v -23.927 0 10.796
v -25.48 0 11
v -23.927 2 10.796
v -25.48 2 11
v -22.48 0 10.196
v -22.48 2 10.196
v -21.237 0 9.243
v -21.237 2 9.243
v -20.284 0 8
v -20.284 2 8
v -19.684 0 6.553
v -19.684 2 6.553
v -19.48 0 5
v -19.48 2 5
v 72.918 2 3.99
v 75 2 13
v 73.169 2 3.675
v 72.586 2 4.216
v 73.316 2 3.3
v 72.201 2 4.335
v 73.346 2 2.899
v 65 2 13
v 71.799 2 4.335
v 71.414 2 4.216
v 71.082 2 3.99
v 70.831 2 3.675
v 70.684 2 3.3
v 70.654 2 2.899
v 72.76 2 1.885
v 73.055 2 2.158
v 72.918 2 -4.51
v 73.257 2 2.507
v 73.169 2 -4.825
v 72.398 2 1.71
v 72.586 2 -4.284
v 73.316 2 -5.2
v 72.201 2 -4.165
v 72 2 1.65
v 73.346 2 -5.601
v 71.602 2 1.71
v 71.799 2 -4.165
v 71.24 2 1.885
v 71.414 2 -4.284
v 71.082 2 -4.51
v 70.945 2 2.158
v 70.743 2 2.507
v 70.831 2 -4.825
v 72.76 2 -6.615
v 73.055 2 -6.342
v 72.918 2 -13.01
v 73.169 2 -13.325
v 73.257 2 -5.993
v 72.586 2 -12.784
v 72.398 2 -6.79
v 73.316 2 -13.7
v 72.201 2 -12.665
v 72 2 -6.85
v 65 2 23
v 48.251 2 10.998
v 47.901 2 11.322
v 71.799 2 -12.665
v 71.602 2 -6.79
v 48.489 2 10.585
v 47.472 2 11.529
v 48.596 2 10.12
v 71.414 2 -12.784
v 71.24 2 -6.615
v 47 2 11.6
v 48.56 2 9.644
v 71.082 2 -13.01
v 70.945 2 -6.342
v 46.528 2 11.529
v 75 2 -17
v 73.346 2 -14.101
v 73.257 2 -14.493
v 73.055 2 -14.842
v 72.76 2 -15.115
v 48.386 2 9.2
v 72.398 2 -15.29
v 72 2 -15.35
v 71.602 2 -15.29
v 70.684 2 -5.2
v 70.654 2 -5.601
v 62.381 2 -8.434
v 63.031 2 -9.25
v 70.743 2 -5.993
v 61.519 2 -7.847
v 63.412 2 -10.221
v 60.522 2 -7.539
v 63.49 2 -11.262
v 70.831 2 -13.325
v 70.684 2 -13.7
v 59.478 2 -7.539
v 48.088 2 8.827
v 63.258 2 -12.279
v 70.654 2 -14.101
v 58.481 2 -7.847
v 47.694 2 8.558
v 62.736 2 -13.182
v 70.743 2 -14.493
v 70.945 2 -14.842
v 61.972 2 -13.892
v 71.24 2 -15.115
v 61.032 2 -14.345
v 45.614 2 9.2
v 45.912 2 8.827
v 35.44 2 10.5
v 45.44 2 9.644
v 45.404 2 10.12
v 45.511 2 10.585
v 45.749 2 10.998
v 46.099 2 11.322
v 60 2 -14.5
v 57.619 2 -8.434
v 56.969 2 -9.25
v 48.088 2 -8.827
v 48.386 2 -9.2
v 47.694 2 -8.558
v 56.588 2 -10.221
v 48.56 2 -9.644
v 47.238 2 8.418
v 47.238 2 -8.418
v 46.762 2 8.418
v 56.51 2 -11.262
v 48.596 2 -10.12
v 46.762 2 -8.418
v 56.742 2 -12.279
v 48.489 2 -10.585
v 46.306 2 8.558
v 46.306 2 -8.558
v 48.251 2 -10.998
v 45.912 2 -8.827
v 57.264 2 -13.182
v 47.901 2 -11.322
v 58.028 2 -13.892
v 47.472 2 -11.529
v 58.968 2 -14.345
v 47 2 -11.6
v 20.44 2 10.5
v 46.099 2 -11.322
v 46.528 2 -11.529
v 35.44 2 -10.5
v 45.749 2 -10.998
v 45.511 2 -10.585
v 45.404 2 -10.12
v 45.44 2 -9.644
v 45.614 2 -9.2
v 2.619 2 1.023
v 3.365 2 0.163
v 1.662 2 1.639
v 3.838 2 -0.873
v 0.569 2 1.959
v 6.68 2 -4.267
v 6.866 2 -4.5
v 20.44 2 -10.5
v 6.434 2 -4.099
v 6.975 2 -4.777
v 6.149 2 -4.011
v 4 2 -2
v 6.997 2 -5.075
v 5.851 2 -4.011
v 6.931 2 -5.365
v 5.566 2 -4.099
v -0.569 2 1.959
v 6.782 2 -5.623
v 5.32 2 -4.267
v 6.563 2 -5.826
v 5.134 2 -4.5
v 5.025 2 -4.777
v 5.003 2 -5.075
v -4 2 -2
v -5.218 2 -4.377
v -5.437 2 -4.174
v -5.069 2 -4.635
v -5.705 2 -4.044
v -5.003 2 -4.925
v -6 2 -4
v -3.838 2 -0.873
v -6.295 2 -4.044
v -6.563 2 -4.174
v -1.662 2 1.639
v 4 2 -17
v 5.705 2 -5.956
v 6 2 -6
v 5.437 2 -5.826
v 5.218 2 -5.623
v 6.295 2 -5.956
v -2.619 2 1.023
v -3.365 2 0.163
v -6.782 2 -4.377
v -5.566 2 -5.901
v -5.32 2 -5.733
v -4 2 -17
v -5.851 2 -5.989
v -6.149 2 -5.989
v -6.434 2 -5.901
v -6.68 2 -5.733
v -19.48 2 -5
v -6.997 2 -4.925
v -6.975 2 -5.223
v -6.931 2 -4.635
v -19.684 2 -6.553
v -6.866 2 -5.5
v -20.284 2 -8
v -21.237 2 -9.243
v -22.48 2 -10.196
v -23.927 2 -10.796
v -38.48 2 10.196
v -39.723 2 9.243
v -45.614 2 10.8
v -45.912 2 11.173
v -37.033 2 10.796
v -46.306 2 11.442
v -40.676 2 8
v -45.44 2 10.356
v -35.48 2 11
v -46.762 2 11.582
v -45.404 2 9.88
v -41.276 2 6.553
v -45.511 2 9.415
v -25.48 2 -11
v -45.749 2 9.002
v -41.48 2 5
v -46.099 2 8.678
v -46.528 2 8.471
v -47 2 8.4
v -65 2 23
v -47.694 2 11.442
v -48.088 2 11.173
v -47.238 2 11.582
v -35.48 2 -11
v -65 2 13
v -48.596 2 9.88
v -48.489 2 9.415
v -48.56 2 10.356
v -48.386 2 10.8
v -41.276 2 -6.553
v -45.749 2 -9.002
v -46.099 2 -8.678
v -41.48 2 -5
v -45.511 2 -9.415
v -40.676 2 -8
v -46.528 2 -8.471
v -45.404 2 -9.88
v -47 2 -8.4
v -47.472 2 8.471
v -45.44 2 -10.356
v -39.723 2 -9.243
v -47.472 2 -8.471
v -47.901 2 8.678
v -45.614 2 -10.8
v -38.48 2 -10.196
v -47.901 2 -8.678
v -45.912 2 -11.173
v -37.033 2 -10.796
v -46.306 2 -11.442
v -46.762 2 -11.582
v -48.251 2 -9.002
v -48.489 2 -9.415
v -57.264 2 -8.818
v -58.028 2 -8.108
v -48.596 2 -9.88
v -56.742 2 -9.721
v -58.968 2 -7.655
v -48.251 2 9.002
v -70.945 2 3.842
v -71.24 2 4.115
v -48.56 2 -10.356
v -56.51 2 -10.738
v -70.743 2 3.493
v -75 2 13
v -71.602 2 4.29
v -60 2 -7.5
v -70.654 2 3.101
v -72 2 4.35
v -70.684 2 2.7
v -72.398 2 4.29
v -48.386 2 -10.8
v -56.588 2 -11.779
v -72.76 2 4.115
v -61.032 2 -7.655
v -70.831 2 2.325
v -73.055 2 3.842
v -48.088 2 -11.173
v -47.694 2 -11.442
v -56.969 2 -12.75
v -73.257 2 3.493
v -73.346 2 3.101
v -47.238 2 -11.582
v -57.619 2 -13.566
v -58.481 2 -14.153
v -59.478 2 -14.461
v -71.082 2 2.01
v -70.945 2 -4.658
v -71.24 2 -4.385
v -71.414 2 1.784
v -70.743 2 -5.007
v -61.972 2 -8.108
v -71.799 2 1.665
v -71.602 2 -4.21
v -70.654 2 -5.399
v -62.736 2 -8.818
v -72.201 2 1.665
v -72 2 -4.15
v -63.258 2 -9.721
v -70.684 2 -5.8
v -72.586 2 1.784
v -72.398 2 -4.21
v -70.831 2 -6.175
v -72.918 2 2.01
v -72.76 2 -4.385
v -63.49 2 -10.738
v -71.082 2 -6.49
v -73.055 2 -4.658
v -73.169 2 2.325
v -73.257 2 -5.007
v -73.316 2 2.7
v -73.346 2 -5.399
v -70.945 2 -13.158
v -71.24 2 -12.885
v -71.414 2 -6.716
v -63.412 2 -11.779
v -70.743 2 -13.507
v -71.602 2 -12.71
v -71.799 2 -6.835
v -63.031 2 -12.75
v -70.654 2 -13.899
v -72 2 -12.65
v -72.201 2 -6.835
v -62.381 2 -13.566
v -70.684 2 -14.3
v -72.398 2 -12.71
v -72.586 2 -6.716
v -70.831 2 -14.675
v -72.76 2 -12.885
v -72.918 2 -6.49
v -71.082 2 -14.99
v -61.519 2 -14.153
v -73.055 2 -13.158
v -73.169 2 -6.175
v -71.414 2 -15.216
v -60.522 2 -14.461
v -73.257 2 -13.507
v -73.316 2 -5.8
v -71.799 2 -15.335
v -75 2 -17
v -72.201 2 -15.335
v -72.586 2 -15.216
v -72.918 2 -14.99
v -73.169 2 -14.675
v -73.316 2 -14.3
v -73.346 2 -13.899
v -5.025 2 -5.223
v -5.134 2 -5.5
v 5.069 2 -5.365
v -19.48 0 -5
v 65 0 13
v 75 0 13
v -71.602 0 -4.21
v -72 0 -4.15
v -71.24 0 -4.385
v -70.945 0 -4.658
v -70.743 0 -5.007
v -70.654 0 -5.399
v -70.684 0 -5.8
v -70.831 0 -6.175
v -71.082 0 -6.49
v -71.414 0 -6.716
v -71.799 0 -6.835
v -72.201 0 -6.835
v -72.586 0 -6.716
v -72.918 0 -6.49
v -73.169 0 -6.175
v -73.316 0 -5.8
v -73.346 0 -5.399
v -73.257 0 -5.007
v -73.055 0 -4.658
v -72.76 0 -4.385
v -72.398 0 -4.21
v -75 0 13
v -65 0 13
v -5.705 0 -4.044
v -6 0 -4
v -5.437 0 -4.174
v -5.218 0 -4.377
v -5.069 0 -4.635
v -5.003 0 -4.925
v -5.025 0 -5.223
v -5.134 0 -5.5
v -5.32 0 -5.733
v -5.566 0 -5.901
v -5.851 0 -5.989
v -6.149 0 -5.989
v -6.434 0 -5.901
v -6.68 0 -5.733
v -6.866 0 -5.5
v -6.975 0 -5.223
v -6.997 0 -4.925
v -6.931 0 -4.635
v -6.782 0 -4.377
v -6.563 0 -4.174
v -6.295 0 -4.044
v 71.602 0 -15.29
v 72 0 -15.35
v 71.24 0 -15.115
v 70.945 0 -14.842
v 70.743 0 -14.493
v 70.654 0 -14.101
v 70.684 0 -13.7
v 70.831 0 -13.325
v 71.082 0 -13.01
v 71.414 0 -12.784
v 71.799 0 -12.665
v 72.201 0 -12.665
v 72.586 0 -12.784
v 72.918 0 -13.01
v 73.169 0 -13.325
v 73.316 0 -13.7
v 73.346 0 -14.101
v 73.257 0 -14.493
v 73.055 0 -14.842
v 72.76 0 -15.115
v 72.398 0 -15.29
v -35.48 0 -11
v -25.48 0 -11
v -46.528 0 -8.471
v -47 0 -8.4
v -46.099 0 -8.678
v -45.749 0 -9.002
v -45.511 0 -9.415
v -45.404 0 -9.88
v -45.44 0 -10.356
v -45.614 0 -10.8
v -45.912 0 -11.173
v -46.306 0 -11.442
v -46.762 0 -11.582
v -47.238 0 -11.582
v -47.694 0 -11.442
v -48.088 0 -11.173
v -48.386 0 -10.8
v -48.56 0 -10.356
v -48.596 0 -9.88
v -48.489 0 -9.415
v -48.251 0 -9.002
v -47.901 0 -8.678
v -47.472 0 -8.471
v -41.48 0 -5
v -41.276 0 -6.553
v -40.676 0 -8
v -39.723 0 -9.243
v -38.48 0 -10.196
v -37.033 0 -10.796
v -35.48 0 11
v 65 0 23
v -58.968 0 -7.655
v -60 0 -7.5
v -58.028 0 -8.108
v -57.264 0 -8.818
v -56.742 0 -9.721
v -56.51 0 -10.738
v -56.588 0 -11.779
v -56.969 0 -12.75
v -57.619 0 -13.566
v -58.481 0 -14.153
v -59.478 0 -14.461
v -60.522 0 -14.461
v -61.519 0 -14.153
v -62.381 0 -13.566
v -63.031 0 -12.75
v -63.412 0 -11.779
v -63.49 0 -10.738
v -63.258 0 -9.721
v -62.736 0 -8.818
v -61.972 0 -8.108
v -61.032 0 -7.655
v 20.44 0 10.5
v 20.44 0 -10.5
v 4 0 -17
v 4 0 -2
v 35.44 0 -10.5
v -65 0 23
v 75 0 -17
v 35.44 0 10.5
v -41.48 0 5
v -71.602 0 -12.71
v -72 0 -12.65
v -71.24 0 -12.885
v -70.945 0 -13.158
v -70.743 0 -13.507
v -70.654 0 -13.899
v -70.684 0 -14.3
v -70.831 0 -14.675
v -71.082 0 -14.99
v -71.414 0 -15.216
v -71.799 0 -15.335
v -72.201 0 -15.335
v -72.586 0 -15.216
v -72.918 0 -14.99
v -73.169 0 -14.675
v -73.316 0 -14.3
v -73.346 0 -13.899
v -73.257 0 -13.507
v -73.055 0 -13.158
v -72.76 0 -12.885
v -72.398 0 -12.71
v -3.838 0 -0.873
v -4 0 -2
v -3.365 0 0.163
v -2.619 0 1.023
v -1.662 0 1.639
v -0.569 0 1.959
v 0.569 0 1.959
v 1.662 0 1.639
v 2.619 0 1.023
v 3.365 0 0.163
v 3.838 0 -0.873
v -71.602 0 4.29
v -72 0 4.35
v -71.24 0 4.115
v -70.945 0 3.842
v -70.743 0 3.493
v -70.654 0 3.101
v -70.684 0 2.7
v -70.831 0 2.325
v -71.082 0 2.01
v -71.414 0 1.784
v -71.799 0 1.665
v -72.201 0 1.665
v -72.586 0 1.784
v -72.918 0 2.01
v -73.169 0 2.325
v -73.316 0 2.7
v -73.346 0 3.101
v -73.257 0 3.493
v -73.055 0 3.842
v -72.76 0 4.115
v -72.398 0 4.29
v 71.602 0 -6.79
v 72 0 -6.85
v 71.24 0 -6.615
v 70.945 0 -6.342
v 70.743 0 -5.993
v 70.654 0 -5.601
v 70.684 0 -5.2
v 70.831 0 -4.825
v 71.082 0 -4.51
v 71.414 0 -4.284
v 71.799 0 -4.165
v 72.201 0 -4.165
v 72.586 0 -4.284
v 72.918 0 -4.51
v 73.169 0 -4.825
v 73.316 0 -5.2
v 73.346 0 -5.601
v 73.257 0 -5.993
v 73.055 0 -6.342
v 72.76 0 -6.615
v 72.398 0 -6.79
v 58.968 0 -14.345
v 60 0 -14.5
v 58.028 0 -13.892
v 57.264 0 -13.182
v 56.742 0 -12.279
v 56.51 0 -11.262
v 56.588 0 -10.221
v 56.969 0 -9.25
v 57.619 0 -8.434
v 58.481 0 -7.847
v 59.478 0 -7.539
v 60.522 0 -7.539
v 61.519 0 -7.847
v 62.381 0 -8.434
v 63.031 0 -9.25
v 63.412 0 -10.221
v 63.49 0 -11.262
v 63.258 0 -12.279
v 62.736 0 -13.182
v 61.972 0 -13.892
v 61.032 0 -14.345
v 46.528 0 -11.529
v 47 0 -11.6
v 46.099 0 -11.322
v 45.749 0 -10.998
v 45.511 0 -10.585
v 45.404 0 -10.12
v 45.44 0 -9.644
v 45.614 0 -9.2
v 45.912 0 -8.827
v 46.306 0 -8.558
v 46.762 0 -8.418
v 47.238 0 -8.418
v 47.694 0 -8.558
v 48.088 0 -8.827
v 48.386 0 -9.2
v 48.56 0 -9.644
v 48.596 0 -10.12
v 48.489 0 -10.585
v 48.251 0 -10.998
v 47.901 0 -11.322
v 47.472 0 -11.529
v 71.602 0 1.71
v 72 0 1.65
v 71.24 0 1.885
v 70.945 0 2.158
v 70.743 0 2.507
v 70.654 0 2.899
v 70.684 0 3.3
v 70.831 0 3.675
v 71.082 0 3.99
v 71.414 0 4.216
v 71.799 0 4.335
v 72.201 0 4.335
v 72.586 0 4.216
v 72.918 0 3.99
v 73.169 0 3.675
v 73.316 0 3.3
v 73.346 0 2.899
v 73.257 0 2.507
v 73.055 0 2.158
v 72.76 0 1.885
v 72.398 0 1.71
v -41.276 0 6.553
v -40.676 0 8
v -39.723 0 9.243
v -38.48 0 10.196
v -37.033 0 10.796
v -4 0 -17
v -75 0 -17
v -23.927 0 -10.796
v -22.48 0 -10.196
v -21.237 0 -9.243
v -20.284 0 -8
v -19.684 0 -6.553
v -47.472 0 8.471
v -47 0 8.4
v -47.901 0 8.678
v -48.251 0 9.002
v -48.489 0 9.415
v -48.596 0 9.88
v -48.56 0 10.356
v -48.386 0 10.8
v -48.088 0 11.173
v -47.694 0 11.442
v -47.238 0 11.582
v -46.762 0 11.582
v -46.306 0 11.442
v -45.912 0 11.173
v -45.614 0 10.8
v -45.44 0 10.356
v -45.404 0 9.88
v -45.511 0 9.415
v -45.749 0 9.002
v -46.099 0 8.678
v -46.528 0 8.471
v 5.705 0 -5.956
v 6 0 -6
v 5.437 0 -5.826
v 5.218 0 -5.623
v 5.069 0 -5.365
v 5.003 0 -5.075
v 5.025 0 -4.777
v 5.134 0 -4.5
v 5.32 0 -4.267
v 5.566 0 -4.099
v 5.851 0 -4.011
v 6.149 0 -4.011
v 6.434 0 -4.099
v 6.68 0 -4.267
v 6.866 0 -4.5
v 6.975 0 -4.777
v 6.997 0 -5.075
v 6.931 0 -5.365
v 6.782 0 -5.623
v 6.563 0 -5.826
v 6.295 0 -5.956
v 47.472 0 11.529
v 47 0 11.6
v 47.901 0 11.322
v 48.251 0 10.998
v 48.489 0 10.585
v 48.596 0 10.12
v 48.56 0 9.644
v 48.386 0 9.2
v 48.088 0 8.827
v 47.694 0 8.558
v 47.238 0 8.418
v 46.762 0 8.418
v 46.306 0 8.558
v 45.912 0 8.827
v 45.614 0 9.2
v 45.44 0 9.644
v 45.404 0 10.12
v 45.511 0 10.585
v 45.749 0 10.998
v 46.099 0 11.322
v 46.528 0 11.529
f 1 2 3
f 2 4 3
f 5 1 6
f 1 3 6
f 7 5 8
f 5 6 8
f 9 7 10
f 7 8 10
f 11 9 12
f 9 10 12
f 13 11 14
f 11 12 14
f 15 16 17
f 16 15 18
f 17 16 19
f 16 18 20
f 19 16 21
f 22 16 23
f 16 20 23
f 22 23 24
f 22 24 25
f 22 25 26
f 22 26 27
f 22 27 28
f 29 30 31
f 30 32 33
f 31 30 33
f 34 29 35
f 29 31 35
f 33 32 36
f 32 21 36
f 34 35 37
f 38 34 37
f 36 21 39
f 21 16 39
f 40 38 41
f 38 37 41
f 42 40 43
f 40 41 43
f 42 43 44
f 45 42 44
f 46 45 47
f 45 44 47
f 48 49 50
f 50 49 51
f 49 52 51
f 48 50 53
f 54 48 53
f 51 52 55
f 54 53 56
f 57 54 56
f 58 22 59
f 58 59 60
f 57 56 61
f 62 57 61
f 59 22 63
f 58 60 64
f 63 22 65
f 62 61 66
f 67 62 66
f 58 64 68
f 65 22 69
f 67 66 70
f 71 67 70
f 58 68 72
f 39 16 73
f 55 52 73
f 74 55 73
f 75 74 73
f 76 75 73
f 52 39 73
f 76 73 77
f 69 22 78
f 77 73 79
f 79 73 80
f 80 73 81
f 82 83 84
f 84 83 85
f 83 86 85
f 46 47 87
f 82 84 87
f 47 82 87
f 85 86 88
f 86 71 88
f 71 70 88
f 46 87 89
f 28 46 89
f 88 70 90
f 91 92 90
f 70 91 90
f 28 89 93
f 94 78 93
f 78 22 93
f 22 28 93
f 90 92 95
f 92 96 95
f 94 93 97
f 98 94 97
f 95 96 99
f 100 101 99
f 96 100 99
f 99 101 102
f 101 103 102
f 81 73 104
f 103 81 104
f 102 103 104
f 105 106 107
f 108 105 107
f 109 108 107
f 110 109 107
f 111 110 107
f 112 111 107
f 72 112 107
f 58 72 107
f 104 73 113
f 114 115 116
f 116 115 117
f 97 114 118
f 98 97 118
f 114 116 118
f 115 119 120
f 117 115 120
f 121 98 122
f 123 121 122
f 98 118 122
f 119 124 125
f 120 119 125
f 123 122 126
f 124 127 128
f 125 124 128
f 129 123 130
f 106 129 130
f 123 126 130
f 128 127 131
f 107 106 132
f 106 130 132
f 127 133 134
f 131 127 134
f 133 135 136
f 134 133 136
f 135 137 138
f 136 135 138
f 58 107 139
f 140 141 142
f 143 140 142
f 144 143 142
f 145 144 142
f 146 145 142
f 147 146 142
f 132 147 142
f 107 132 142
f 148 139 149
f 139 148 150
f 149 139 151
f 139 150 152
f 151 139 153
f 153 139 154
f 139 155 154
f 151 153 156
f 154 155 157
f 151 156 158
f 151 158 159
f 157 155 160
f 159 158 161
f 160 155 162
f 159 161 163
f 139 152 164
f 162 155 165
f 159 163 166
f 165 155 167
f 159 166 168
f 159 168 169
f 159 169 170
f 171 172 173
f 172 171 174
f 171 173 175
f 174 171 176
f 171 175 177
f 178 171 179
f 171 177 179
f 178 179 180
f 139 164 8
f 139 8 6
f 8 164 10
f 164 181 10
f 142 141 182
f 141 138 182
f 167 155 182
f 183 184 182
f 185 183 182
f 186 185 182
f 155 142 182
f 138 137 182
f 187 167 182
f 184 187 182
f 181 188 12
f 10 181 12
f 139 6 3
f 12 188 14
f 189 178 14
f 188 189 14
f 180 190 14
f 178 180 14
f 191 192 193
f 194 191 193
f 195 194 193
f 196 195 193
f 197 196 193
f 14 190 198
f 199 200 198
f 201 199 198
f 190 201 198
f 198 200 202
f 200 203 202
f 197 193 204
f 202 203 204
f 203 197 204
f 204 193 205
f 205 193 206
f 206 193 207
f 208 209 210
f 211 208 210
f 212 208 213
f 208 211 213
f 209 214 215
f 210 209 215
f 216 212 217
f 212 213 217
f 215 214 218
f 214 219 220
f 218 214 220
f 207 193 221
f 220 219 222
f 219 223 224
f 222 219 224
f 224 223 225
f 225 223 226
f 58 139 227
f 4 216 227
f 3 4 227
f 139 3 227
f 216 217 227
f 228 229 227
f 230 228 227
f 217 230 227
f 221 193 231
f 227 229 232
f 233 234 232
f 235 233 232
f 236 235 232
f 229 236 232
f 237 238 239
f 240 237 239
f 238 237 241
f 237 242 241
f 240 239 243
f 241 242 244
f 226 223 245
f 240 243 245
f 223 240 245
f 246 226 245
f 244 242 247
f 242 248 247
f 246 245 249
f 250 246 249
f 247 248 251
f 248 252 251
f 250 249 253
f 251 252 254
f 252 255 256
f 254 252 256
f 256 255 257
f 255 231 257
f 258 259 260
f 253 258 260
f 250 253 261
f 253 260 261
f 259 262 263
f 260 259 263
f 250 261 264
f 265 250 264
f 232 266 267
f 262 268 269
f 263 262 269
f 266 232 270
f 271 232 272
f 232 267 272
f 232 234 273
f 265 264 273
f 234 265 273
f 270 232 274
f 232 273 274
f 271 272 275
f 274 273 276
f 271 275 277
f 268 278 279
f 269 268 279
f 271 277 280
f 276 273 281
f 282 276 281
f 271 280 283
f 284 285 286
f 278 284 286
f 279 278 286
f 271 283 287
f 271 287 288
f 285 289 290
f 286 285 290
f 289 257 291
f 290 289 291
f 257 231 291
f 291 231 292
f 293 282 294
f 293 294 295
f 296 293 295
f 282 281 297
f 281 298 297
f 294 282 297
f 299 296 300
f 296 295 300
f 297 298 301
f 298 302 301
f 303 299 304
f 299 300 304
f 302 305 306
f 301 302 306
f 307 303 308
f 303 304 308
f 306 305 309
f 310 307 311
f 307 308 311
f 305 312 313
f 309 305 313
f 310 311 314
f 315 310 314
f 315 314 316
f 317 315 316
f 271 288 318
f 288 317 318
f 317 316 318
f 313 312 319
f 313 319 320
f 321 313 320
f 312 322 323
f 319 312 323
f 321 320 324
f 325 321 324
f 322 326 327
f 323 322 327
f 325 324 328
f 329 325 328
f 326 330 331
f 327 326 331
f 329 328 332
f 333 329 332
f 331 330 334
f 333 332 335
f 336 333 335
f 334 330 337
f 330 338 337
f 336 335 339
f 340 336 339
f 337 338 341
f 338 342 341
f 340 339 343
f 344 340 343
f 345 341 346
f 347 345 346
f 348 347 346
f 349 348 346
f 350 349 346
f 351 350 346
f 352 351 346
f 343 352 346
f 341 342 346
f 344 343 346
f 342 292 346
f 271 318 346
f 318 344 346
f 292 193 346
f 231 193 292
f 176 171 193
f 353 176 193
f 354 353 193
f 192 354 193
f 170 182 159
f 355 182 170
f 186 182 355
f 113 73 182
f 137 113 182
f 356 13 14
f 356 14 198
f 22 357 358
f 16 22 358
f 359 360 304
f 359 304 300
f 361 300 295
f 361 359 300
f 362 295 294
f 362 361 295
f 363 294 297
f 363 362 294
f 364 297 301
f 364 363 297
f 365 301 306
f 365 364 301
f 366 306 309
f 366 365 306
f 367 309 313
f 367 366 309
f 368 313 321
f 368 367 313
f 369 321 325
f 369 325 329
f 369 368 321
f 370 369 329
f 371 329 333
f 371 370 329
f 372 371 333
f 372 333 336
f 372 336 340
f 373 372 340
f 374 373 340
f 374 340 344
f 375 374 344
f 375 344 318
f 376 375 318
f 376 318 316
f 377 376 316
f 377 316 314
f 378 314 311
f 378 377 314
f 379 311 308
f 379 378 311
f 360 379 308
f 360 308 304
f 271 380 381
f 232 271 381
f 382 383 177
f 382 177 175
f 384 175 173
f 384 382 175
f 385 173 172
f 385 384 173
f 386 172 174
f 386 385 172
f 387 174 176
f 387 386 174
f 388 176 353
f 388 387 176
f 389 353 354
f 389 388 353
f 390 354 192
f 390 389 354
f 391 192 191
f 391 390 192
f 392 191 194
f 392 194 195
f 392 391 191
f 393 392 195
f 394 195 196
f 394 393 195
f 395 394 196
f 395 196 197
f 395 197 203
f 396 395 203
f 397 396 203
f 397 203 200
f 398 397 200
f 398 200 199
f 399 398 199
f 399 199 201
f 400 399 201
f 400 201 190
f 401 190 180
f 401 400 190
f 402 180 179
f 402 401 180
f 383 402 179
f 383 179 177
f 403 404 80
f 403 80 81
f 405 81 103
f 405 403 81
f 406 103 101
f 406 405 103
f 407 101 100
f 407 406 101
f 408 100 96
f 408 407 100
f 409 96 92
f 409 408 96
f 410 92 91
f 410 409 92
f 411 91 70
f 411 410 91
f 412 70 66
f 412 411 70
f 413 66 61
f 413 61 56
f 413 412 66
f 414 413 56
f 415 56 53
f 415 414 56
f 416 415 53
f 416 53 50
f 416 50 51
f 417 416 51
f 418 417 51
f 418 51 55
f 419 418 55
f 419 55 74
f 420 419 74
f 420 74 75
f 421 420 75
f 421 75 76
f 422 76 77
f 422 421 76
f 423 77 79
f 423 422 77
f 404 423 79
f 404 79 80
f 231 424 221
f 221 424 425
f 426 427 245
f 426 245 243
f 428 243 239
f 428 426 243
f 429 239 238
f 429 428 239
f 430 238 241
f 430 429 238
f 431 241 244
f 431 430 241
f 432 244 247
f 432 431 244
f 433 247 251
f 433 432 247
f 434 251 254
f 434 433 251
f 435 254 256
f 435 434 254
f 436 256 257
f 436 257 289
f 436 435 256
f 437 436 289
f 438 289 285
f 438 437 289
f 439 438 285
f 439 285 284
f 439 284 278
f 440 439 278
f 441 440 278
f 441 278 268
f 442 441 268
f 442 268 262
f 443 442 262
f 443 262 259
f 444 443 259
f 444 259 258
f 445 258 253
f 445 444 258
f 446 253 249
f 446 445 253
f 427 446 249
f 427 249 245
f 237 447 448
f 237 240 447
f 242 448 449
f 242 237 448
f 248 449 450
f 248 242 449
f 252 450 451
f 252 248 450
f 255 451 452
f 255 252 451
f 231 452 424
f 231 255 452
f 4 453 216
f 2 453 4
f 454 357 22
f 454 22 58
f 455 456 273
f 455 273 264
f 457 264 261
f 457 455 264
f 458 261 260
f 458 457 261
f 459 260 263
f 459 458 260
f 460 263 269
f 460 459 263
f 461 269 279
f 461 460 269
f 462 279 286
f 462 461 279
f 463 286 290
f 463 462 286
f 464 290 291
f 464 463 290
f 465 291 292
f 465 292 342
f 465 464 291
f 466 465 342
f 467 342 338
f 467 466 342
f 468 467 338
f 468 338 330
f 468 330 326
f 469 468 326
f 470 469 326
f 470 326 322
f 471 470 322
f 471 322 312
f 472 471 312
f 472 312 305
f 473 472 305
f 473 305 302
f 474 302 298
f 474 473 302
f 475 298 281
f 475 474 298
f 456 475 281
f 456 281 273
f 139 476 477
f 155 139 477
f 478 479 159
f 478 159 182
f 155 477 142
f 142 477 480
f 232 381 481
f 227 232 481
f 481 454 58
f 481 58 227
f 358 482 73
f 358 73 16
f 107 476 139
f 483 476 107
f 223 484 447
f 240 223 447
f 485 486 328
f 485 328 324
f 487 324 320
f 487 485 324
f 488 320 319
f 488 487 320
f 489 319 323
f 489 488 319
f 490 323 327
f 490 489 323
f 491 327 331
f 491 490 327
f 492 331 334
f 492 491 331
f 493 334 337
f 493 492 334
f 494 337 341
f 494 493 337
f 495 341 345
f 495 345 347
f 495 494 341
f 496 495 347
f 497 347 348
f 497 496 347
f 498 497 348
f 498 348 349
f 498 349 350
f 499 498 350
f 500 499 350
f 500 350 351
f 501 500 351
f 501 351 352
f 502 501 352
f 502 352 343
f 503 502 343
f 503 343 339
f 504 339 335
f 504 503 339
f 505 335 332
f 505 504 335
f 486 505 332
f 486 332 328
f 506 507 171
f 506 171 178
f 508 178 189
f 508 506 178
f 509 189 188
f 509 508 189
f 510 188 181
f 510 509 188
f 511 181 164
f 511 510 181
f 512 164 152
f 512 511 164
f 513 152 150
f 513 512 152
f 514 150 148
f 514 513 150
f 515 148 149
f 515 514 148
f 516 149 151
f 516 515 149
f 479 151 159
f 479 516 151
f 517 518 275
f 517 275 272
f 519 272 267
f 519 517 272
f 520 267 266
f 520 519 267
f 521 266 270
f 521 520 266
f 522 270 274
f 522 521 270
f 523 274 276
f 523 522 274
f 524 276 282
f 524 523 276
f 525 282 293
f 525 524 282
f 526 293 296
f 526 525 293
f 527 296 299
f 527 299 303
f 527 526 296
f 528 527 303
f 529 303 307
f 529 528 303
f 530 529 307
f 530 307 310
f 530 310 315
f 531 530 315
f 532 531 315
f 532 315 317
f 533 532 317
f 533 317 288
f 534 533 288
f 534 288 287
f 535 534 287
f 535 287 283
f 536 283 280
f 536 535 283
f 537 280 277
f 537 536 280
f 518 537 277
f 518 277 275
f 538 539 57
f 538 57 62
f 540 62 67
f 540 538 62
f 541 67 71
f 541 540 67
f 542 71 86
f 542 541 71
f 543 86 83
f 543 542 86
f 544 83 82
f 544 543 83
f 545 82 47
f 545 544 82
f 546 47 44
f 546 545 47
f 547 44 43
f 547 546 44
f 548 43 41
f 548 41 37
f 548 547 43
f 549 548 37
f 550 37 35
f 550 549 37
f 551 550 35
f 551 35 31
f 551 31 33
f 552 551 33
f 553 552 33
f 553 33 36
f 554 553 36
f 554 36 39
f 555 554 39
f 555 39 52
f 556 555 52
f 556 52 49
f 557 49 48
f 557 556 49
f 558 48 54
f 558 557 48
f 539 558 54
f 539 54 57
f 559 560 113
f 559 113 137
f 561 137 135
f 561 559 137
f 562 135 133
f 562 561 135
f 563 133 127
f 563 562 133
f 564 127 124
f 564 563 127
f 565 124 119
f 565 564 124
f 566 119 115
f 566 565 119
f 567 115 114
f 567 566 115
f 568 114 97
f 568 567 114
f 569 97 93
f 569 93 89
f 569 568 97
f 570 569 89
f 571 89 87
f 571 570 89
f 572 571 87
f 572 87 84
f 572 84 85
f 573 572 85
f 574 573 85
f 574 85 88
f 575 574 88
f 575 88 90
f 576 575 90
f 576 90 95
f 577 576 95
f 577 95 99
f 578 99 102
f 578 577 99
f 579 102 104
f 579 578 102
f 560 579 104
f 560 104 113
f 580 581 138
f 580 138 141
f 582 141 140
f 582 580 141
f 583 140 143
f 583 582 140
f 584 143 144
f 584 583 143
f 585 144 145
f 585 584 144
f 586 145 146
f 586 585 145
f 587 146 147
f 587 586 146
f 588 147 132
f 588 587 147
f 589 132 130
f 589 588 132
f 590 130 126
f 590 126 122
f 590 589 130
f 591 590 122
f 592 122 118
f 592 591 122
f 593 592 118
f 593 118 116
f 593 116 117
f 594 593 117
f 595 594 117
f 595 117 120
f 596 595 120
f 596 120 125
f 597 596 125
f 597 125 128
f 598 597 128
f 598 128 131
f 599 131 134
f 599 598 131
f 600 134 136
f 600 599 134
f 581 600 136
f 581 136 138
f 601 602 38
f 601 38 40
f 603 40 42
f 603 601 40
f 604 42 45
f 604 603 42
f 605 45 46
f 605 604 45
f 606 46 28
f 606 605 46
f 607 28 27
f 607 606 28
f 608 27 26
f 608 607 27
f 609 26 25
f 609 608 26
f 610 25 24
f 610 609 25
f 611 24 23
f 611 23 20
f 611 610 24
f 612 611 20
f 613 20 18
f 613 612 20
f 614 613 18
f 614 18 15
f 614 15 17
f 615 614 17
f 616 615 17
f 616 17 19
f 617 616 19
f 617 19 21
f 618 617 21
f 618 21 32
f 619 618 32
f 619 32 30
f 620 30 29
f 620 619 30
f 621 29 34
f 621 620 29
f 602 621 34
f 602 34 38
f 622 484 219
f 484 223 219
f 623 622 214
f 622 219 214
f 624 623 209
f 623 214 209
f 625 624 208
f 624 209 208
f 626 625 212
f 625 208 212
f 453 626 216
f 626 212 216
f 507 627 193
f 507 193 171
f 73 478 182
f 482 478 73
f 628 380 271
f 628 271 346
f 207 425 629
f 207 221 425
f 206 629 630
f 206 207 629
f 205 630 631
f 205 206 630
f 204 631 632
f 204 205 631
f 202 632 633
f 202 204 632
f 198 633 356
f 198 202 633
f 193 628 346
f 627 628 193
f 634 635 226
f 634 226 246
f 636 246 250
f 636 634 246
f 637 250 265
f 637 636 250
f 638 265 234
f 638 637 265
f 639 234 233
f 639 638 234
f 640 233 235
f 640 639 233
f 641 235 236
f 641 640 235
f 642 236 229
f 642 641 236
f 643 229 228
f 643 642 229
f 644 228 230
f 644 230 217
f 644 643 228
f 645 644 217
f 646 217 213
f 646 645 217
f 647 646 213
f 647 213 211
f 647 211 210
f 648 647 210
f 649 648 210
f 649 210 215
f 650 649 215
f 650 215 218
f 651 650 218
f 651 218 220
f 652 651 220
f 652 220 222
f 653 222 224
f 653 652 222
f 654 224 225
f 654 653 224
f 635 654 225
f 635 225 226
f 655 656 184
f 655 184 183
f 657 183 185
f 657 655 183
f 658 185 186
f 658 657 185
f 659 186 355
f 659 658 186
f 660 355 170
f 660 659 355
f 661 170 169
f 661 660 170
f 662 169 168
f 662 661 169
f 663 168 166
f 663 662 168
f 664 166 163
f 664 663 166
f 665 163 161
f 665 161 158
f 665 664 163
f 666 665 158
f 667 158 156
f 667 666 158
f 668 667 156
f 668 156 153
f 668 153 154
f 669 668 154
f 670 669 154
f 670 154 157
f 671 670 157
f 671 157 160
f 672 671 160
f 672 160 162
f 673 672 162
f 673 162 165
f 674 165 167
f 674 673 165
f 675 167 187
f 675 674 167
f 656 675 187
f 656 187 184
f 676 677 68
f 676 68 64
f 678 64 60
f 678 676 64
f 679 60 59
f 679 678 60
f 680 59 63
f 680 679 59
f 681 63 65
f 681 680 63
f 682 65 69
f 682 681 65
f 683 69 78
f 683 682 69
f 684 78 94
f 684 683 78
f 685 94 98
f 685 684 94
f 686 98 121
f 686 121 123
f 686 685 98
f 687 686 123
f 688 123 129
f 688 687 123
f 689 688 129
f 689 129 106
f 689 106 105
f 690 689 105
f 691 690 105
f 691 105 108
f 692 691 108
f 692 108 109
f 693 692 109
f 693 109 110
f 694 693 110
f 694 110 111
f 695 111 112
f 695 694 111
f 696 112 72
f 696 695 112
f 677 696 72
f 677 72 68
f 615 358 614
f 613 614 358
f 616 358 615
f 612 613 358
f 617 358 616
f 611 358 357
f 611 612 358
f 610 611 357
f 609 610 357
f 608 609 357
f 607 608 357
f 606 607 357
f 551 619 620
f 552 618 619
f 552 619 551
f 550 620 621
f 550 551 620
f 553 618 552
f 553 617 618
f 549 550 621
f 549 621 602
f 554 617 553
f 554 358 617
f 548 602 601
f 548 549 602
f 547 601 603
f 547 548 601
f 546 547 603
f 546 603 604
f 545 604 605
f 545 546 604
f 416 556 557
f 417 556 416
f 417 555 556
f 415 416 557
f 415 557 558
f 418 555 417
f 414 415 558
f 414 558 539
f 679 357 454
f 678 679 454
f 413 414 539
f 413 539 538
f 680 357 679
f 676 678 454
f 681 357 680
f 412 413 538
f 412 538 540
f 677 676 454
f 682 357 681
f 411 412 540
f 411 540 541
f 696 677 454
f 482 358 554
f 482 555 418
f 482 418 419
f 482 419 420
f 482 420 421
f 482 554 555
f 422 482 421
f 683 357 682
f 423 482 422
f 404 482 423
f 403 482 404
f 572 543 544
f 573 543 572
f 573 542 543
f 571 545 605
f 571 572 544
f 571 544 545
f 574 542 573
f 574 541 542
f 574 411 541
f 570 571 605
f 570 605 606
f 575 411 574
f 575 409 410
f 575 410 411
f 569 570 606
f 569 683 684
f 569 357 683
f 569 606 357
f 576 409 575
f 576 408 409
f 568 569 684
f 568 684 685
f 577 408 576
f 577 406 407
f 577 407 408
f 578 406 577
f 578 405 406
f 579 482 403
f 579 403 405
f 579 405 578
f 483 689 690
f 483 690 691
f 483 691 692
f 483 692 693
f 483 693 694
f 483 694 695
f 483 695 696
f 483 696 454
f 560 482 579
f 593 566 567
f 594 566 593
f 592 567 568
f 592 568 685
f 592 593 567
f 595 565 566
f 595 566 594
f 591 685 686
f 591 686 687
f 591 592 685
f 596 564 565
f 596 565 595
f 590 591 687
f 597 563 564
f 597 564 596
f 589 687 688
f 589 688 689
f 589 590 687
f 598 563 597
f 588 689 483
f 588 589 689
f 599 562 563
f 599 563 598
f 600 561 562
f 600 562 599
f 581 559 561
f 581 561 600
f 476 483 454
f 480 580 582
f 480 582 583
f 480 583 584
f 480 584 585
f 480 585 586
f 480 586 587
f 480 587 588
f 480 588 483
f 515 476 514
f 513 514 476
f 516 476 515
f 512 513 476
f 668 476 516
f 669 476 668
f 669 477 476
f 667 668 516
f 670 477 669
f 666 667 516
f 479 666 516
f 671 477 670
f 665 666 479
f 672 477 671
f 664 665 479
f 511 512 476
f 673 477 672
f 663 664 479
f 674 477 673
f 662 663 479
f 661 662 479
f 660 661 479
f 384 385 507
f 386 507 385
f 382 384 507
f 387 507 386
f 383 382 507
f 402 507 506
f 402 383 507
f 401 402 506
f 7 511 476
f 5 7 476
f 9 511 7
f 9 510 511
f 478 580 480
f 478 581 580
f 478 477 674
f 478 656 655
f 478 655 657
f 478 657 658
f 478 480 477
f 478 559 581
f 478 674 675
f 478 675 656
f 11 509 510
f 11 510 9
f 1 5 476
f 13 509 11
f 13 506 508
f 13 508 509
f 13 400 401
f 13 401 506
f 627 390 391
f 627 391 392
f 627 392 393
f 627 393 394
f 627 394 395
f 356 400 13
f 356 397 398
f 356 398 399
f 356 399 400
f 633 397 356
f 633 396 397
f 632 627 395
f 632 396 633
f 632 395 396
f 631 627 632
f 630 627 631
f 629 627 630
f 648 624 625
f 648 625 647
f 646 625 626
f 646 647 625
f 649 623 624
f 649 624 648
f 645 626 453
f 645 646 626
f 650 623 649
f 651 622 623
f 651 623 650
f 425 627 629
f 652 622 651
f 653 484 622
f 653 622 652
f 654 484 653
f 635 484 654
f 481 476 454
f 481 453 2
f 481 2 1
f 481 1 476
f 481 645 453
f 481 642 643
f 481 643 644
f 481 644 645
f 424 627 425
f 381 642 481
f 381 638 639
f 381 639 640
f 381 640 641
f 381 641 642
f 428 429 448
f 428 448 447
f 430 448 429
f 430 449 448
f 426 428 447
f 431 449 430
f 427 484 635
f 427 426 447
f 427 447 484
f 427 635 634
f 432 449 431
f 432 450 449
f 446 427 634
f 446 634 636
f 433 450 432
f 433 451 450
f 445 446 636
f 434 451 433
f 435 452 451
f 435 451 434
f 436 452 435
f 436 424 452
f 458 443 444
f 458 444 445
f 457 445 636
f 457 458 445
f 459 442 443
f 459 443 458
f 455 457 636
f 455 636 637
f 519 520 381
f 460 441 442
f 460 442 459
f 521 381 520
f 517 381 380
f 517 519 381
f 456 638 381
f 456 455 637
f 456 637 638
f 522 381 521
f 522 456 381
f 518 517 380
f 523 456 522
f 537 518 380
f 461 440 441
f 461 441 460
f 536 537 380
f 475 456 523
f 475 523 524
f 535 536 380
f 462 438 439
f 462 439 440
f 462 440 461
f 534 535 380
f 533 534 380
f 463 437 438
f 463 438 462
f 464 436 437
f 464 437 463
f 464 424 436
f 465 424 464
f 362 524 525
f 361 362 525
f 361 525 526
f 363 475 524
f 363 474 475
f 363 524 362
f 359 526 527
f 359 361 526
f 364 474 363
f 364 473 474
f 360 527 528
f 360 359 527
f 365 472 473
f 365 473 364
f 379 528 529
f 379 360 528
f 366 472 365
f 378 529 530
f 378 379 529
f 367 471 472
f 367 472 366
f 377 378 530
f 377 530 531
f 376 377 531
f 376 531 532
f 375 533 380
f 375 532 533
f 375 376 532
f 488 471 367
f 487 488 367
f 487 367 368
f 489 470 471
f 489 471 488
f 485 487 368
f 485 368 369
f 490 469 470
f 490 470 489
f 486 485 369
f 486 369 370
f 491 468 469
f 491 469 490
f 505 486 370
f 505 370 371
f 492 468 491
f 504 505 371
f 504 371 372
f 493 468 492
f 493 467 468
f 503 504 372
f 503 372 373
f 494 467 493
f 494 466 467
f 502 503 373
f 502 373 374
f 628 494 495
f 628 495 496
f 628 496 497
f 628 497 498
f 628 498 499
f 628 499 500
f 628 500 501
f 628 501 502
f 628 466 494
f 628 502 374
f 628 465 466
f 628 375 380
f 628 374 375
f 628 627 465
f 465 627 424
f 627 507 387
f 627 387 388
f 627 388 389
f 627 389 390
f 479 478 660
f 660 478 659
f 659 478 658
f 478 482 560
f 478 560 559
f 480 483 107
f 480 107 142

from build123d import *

# Parameters (mm, degrees)
SKETCH_1_R          = 1.35
SKETCH_1_R_2        = 3.5
SKETCH_1_R_3        = 1.6
SKETCH_1_R_4        = 1
SKETCH_1_W          = 22
SKETCH_1_H          = 22
SKETCH_1_W_2        = 15
SKETCH_1_H_2        = 21
EXTRUDE_1_DEPTH     = 2
FILLET_1_R          = 6
SKETCH_2_W          = 16.043978469
SKETCH_2_H          = 25.917195988
CUT_EXTRUDE_1_DEPTH = 79.472925267


with BuildPart() as part:
    # 草图1 → 凸台-拉伸1 (new body)
    with BuildSketch(Plane(origin=(0, 0, 0), x_dir=(1, 0, 0), z_dir=(0, 1, 0))):
        with BuildLine():
            Line((-75, 17), (-4, 17))
            Line((-4, 17), (-4, 2))
            ThreePointArc((-4, 2), (0, -2), (4, 2))
            Line((4, 2), (4, 17))
            Line((4, 17), (75, 17))
            Line((75, 17), (75, -17))
            Line((75, -17), (75, -23))
            Line((75, -23), (-75, -23))
            Line((-75, -23), (-75, -17))
            Line((-75, -17), (-75, 17))
        make_face()
        with Locations(Location((-72, 14, 0), (0, 0, 270))):
            Circle(SKETCH_1_R, mode=Mode.SUBTRACT)
        with Locations(Location((-72, -3, 0), (0, 0, 270))):
            Circle(SKETCH_1_R, mode=Mode.SUBTRACT)
        with Locations(Location((72, -3, 0), (0, 0, 90))):
            Circle(SKETCH_1_R, mode=Mode.SUBTRACT)
        with Locations(Location((72, 14, 0), (0, 0, 90))):
            Circle(SKETCH_1_R, mode=Mode.SUBTRACT)
        with Locations(Location((-60, 11, 0), (0, 0, 270))):
            Circle(SKETCH_1_R_2, mode=Mode.SUBTRACT)
        with Locations(Location((60, 11, 0), (0, 0, 90))):
            Circle(SKETCH_1_R_2, mode=Mode.SUBTRACT)
        with Locations(Location((-47, 10, 0), (0, 0, 270))):
            Circle(SKETCH_1_R_3, mode=Mode.SUBTRACT)
        with Locations(Location((47, 10, 0), (0, 0, 90))):
            Circle(SKETCH_1_R_3, mode=Mode.SUBTRACT)
        with Locations(Location((47, -10, 0), (0, 0, 270))):
            Circle(SKETCH_1_R_3, mode=Mode.SUBTRACT)
        with Locations(Location((-47, -10, 0), (0, 0, 90))):
            Circle(SKETCH_1_R_3, mode=Mode.SUBTRACT)
        with Locations(Location((-6, 5, 0), (0, 0, 270))):
            Circle(SKETCH_1_R_4, mode=Mode.SUBTRACT)
        with Locations(Location((6, 5, 0), (0, 0, 90))):
            Circle(SKETCH_1_R_4, mode=Mode.SUBTRACT)
        with Locations(Location((-72, 5.5, 0), (0, 0, 270))):
            Circle(SKETCH_1_R, mode=Mode.SUBTRACT)
        with Locations(Location((72, 5.5, 0), (0, 0, 90))):
            Circle(SKETCH_1_R, mode=Mode.SUBTRACT)
        with Locations((-30.48, 0)):
            Rectangle(SKETCH_1_W, SKETCH_1_H, mode=Mode.SUBTRACT)
        with Locations((27.94, 0)):
            Rectangle(SKETCH_1_W_2, SKETCH_1_H_2, mode=Mode.SUBTRACT)
    extrude(amount=EXTRUDE_1_DEPTH)

    # 圆角1
    fillet_1_edges = [part.edges().sort_by_distance(p)[0] for p in [
        (-19.48, 1, 11),
        (-19.48, 1, -11),
        (-41.48, 1, -11),
        (-41.48, 1, 11),
    ]]
    fillet(fillet_1_edges, radius=FILLET_1_R)

    # 草图2 → 切除-拉伸1 (cut, through all)
    with BuildSketch(Plane.XZ):
        with Locations((-73.021989235, 25.958597994)):
            Rectangle(SKETCH_2_W, SKETCH_2_H)
        with Locations((73.021989235, 25.958597994)):
            Rectangle(SKETCH_2_W, SKETCH_2_H)
    extrude(amount=-CUT_EXTRUDE_1_DEPTH, mode=Mode.SUBTRACT)


solid = part.part
